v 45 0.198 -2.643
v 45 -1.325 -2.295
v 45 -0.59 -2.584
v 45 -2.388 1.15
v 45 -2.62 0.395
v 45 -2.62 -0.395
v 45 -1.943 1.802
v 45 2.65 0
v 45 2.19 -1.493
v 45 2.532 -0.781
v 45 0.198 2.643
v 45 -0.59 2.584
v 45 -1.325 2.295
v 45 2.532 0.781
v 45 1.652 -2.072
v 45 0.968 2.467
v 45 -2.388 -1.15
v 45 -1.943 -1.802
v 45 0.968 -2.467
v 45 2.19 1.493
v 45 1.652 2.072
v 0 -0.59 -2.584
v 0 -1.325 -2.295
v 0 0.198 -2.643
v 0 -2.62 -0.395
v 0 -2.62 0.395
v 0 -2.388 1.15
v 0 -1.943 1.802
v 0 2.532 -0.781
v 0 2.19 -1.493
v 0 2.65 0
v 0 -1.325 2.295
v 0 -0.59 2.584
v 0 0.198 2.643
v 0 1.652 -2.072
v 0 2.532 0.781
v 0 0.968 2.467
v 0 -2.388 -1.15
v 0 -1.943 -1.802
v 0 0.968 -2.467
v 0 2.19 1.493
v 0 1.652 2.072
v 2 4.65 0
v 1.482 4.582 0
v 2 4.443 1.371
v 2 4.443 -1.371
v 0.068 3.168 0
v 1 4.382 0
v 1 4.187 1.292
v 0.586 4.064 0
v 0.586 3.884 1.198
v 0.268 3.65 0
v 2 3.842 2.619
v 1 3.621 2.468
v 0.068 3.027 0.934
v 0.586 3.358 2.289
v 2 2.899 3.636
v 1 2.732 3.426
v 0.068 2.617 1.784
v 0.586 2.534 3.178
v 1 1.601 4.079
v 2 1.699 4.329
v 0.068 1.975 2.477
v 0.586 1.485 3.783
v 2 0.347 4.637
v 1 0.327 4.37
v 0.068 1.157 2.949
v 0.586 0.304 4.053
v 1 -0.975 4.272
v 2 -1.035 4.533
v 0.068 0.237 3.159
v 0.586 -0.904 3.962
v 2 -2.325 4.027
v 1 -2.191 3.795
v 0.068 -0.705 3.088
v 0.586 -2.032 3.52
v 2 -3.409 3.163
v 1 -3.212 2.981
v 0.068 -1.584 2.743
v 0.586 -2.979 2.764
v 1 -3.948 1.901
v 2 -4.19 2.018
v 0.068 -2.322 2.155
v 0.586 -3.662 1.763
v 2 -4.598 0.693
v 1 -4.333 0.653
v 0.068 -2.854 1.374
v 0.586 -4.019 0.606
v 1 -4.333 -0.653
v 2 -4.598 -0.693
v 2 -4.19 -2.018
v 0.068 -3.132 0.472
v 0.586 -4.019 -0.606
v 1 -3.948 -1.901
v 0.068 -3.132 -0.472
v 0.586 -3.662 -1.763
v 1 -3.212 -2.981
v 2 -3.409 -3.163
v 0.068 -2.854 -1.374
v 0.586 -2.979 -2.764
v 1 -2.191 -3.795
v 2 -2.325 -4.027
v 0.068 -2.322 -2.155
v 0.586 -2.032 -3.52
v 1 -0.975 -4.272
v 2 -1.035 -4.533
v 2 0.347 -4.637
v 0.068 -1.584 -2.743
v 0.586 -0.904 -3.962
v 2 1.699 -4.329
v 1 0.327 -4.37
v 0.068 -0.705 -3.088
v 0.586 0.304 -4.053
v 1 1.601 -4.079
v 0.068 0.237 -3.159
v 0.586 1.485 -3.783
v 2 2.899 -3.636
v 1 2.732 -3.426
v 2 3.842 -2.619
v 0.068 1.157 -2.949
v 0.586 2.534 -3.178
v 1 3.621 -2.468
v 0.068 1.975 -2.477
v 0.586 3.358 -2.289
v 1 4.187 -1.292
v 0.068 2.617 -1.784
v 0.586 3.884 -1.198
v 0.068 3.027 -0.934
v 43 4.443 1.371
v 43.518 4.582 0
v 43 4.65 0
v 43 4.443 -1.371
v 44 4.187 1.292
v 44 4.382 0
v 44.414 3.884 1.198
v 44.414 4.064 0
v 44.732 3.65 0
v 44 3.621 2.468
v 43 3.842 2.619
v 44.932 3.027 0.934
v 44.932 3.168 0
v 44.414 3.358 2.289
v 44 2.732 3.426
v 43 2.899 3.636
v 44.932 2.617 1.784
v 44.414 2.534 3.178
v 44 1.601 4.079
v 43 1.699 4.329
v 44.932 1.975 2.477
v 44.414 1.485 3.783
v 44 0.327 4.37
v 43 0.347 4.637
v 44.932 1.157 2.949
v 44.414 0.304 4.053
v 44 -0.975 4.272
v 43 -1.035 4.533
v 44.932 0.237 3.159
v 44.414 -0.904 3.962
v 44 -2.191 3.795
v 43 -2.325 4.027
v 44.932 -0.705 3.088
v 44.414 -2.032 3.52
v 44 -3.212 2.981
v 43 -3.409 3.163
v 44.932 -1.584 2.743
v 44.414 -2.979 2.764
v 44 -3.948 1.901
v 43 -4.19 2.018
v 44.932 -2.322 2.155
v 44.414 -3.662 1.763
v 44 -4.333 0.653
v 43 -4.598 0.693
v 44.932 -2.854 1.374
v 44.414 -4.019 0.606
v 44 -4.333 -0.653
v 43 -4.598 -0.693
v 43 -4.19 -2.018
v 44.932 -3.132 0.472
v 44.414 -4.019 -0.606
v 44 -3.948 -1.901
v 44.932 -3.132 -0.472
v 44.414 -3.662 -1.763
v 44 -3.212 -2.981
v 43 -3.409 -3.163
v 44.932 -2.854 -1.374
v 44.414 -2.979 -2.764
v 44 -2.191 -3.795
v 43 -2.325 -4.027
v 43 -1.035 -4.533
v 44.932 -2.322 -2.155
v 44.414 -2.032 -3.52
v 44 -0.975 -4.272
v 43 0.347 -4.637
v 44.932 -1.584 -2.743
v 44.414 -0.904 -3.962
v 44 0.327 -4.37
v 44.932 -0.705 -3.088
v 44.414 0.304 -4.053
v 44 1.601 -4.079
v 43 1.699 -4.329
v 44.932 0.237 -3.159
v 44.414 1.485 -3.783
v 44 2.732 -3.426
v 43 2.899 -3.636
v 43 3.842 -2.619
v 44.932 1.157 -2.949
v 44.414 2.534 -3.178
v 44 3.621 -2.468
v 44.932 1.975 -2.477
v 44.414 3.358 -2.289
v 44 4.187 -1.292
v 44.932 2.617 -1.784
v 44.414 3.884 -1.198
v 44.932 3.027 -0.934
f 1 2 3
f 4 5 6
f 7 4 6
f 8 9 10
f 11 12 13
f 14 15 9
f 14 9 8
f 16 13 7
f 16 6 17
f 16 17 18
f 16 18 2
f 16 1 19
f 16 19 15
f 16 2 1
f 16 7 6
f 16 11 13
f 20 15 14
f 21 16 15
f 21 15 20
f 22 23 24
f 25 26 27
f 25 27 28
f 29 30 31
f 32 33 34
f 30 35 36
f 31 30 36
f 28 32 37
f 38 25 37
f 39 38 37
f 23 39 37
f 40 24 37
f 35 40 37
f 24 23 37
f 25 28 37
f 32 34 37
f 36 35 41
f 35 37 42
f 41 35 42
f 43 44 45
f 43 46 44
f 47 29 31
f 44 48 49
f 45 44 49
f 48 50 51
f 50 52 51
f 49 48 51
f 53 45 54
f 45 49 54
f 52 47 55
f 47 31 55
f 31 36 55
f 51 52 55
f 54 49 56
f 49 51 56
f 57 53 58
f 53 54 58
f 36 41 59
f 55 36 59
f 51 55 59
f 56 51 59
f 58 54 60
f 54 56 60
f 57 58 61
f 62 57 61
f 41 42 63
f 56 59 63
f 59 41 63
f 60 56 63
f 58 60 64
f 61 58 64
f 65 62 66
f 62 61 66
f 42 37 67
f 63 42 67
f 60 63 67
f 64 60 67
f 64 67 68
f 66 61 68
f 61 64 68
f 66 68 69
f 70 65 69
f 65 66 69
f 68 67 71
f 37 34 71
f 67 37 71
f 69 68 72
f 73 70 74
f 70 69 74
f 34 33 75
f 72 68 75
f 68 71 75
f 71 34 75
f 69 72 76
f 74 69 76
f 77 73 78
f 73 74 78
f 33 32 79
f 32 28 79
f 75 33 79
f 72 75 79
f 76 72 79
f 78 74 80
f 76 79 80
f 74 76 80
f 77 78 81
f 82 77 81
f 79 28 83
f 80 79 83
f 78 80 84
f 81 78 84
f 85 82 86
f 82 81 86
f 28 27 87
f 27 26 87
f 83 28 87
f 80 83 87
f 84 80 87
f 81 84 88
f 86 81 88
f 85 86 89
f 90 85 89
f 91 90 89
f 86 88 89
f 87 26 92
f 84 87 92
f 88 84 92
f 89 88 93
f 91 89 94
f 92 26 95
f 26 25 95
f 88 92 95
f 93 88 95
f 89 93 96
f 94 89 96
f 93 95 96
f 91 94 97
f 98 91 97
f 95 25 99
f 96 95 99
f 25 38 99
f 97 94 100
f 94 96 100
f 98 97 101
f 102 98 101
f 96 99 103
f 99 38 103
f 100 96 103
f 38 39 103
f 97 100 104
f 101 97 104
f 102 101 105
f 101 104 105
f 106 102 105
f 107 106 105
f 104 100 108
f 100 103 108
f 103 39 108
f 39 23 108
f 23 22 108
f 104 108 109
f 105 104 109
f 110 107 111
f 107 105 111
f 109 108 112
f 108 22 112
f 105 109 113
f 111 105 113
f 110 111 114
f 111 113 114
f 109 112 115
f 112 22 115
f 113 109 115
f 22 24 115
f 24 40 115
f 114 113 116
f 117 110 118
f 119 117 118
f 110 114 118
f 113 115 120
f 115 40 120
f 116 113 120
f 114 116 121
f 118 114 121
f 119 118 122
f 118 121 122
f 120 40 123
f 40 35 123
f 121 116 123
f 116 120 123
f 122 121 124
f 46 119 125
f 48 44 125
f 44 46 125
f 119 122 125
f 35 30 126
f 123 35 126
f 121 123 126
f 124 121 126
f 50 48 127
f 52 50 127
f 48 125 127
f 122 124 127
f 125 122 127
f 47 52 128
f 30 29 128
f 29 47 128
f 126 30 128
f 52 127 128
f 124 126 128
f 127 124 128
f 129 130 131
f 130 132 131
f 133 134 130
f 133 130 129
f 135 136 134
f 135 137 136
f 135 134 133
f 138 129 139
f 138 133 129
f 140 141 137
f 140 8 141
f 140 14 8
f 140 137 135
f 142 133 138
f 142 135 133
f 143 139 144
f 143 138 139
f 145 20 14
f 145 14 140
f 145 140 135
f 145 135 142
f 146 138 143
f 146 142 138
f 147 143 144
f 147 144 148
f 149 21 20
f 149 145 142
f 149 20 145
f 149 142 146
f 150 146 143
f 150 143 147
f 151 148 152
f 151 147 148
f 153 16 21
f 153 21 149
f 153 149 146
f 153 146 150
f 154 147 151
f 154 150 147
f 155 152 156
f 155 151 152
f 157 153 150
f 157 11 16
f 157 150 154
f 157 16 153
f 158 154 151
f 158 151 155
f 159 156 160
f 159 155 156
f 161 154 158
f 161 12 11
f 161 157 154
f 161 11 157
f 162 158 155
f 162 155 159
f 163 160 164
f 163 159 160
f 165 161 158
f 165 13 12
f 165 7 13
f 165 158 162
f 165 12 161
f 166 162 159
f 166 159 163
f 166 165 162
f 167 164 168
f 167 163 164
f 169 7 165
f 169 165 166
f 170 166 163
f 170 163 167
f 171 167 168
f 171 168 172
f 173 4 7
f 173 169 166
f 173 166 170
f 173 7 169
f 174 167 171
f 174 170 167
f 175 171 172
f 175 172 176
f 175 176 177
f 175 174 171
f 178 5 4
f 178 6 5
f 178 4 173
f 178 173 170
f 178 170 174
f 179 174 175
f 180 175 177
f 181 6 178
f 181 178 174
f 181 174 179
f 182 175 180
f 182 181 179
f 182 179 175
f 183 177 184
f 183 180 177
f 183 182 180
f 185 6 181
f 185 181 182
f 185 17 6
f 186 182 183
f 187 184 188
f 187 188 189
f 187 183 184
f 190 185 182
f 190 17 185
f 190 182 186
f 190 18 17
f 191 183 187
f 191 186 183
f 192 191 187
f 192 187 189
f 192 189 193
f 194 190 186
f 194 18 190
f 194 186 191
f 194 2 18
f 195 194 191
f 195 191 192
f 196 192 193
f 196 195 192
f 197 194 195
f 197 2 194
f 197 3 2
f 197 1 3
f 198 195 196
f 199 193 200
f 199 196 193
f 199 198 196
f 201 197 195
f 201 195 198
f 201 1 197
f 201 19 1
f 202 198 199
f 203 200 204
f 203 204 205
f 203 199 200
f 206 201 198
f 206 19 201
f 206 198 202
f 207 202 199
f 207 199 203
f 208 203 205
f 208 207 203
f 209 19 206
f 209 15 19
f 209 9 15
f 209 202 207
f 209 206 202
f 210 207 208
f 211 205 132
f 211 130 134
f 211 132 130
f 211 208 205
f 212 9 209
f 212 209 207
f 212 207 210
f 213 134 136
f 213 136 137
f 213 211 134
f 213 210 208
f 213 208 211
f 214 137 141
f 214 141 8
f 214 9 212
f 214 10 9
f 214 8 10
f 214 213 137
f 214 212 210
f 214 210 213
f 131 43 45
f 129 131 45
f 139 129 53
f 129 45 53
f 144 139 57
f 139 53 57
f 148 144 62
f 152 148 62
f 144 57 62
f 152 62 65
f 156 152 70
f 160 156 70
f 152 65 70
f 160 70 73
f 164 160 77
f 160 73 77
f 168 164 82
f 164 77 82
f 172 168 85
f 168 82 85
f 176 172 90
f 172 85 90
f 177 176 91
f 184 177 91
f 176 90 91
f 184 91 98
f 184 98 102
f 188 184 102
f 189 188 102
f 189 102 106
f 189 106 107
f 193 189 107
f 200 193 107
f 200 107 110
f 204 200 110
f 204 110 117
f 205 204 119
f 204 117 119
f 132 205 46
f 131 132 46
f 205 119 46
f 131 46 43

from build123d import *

# Parameters (mm, degrees)
F0_R     = 4.65
F1_DEPTH = 45
F2_R     = 2
F3_R     = 2


with BuildPart() as f1:
    # F0 (on Right) → F1 (new body)
    with BuildSketch(Plane.YZ):
        Circle(F0_R)
    extrude(amount=F1_DEPTH)

    # F2
    f2_edges = [f1.edges().sort_by_distance(p)[0] for p in [
        (0, -4.65, 0),
    ]]
    fillet(f2_edges, radius=F2_R)

    # F3
    f3_edges = [f1.edges().sort_by_distance(p)[0] for p in [
        (45, -4.65, 0),
    ]]
    fillet(f3_edges, radius=F3_R)


solid = f1.part
